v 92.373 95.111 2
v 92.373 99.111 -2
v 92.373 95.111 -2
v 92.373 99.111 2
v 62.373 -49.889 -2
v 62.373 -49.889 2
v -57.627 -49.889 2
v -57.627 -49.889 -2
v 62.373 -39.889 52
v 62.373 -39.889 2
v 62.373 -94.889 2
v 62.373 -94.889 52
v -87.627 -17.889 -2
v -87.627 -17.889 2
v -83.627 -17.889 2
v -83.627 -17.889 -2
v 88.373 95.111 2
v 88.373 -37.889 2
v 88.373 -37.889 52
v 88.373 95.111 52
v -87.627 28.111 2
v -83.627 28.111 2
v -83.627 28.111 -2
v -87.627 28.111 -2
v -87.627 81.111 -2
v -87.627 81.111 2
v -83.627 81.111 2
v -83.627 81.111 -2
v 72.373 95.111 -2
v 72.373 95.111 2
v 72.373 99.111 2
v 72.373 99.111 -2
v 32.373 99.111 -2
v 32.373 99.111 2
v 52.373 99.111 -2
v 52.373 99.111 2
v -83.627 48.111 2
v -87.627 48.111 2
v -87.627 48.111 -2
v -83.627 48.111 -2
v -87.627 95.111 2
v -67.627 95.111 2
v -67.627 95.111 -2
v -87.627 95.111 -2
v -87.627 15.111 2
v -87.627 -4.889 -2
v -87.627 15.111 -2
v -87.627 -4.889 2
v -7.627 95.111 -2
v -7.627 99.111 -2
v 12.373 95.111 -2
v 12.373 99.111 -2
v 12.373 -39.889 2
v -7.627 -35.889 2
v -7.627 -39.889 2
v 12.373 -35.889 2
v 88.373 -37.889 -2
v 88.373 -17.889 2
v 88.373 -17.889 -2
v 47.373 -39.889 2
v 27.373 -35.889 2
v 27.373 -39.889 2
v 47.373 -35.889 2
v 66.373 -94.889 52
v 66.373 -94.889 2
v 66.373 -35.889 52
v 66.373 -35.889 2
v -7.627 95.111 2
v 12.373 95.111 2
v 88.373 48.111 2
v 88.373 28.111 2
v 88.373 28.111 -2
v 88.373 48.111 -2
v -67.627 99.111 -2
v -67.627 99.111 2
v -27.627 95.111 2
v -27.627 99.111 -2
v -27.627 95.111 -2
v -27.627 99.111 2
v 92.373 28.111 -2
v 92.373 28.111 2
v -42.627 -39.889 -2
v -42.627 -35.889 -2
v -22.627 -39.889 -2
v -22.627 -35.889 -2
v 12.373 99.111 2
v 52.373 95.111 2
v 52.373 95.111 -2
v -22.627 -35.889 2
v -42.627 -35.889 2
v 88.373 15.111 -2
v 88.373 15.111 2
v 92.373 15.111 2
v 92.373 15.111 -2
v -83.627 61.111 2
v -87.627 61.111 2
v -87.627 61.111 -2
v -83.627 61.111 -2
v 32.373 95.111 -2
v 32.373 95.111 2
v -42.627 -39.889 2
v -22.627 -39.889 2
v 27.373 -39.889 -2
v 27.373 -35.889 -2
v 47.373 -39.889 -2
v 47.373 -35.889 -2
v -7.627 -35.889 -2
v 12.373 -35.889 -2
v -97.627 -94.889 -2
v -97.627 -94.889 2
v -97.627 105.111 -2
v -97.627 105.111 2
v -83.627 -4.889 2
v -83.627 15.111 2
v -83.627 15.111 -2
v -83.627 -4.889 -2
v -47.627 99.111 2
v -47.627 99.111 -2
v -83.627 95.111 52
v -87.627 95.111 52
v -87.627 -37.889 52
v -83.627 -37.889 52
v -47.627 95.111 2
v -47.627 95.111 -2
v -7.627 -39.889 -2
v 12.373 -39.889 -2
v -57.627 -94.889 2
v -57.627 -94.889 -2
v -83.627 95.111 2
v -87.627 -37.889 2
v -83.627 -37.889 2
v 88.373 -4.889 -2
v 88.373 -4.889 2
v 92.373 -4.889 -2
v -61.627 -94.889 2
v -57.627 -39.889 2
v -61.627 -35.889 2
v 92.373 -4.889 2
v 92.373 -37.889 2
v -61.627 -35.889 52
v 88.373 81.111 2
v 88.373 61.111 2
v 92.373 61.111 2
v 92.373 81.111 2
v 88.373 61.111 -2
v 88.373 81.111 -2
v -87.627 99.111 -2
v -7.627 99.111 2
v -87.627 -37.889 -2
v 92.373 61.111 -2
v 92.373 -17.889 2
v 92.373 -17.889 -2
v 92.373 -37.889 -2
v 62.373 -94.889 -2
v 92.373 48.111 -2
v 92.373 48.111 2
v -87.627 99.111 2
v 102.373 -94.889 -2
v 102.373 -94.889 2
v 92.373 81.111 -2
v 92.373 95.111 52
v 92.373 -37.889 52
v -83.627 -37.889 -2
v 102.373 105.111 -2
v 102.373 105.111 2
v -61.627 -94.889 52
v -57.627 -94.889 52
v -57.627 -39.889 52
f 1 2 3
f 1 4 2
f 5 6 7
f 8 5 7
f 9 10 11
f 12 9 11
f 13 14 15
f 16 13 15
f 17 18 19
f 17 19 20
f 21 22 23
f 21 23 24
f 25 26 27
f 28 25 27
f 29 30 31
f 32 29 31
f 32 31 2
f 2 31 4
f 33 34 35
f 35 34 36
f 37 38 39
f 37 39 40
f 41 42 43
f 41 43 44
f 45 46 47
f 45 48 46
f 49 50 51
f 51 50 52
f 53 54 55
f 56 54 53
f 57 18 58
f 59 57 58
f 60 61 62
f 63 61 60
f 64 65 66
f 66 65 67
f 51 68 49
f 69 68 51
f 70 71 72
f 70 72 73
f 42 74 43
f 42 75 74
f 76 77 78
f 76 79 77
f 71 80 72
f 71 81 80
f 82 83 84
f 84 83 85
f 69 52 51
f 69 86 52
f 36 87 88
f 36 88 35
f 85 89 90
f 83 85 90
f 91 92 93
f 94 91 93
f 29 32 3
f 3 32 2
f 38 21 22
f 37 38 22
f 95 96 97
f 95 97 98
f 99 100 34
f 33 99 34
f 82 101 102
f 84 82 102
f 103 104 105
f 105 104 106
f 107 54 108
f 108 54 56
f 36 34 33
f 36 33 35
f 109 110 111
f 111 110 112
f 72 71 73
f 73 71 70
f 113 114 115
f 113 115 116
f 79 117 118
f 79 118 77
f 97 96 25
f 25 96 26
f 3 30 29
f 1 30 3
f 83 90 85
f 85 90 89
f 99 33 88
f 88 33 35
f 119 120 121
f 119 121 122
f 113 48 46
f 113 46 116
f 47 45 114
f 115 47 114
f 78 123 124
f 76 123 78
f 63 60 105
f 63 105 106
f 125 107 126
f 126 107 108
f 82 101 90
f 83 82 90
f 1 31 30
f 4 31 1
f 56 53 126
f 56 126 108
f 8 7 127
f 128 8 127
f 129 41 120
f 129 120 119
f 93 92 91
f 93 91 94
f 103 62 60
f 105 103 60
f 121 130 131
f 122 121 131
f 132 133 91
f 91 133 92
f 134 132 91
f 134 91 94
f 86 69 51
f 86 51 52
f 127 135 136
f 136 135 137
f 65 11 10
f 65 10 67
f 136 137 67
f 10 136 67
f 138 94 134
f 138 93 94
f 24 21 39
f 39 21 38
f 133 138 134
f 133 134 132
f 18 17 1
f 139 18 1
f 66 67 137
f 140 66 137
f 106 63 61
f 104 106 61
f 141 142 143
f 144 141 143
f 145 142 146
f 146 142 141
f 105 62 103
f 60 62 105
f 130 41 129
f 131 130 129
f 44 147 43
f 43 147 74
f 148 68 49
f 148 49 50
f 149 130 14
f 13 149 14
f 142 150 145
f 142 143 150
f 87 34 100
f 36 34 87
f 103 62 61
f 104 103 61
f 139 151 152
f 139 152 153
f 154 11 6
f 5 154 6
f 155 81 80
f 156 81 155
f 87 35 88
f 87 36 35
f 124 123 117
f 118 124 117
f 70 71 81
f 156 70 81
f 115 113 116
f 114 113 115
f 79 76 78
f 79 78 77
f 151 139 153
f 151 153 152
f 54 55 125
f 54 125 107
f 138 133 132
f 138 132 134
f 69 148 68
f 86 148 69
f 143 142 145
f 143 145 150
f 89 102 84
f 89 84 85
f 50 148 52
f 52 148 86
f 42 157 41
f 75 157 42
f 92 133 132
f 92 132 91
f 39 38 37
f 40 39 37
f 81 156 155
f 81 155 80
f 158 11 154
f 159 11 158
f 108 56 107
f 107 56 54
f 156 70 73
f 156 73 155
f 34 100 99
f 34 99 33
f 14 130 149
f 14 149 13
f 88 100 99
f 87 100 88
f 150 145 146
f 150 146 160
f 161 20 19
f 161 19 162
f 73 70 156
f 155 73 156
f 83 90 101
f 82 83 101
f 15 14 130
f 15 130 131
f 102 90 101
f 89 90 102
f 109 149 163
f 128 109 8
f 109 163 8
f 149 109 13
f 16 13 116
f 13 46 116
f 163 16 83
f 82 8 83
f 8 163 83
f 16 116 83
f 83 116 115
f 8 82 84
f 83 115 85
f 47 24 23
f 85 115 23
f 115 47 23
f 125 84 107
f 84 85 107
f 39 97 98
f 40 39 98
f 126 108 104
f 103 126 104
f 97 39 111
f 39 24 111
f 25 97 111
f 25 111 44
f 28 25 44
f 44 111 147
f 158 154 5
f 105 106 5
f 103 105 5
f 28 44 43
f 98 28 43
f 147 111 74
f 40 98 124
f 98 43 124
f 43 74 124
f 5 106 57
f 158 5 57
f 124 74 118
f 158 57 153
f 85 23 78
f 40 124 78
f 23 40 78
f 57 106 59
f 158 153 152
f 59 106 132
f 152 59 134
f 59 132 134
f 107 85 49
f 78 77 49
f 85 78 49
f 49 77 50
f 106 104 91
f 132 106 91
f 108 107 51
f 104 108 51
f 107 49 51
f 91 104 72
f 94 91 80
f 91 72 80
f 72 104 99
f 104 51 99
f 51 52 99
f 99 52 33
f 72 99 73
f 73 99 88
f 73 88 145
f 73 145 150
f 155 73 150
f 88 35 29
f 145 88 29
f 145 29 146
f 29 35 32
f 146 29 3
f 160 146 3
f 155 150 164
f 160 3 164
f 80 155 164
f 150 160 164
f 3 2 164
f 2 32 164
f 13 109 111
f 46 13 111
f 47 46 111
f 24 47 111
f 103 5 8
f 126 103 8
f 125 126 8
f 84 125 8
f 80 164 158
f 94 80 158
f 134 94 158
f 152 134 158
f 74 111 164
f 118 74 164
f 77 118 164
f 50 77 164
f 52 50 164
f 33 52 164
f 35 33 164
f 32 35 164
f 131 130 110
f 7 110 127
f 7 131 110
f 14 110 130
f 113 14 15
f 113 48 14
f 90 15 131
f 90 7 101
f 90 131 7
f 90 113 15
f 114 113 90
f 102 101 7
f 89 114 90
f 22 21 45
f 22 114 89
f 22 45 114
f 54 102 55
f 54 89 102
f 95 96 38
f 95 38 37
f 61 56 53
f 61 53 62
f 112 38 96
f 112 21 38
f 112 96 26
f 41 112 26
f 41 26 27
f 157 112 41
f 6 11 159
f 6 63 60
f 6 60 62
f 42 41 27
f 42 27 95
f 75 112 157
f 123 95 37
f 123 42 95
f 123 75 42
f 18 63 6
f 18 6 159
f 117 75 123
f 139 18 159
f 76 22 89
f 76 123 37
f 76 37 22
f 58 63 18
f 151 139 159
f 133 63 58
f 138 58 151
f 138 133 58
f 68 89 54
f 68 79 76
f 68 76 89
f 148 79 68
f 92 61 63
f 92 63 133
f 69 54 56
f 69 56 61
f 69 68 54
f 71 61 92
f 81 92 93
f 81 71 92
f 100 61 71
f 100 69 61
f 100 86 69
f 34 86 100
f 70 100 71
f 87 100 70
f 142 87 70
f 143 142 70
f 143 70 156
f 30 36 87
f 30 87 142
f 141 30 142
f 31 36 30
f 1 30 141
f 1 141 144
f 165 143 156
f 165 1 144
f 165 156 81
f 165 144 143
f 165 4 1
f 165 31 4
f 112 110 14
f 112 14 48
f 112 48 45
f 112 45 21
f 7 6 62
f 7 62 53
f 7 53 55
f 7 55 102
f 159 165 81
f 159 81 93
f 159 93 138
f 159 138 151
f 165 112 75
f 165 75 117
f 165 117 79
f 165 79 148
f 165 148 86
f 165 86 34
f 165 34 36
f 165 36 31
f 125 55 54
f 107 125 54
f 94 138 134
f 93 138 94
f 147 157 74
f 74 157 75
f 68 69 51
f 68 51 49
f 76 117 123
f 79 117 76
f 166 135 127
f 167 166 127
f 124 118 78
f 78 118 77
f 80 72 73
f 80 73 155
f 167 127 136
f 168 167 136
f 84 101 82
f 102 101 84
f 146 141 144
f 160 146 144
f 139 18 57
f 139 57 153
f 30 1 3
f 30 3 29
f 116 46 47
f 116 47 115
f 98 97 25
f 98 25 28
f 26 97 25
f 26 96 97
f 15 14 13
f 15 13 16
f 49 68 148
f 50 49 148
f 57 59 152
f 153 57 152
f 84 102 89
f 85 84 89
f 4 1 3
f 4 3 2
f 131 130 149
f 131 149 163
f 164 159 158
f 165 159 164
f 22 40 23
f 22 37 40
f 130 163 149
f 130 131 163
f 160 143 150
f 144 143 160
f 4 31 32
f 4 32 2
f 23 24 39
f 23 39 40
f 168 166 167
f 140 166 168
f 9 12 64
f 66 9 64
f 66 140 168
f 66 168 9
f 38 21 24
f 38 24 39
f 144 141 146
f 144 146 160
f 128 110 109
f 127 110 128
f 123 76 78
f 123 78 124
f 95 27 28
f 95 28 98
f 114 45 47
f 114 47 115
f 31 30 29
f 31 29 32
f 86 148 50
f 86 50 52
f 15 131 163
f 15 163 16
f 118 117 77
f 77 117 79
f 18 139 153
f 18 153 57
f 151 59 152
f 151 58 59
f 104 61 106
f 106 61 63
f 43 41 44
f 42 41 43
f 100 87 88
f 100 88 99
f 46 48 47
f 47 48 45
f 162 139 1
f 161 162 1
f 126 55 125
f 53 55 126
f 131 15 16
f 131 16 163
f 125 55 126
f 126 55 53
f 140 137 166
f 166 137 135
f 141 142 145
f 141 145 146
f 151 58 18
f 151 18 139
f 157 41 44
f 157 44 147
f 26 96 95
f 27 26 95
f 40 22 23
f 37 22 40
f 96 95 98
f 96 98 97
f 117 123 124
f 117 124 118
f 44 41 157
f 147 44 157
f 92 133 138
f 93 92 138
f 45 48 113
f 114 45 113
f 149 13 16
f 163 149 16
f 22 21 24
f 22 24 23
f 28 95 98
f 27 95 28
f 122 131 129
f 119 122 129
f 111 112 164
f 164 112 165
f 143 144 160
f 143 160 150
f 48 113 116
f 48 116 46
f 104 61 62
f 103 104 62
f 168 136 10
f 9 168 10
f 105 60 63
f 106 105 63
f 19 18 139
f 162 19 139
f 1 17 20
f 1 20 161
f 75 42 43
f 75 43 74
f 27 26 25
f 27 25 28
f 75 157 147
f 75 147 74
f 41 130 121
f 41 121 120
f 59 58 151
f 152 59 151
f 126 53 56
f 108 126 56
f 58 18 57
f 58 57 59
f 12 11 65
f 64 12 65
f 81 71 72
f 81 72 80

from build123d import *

# Parameters (mm, degrees)
F0_W     = 200
F0_H     = 200
F1_DEPTH = 2
F3_DEPTH = 4
F4_W     = 10
F4_H     = 4
F5_DEPTH = 25
F6_W     = 4
F6_H     = 20
F7_DEPTH = 4
F6_W_2   = 20
F6_H_2   = 4
F8_W     = 4
F8_H     = 133
F9_DEPTH = 50
F8_W_2   = 120
F8_H_2   = 4


with BuildPart() as f1:
    # F0 (on Top) → F1 (new body, symmetric)
    with BuildSketch(Plane.XY):
        with Locations((2.3726588649, 5.1106324806)):
            Rectangle(F0_W, F0_H)
        Polygon((-87.6273411351, -37.8893675194), (-87.6273411351, -27.8893675194), (-87.6273411351, -17.8893675194), (-83.6273411351, -17.8893675194), (-83.6273411351, -27.8893675194), (-83.6273411351, -37.8893675194), align=None, mode=Mode.SUBTRACT)
        Polygon((92.3726588649, -17.8893675194), (92.3726588649, -27.8893675194), (92.3726588649, -37.8893675194), (88.3726588649, -37.8893675194), (88.3726588649, -27.8893675194), (88.3726588649, -17.8893675194), align=None, mode=Mode.SUBTRACT)
        Polygon((-87.6273411351, 5.1106324806), (-87.6273411351, 15.1106324806), (-83.6273411351, 15.1106324806), (-83.6273411351, 5.1106324806), (-83.6273411351, -4.8893675194), (-87.6273411351, -4.8893675194), align=None, mode=Mode.SUBTRACT)
        Polygon((-83.6273411351, 28.1106324806), (-87.6273411351, 28.1106324806), (-87.6273411351, 38.1106324806), (-87.6273411351, 48.1106324806), (-83.6273411351, 48.1106324806), (-83.6273411351, 38.1106324806), align=None, mode=Mode.SUBTRACT)
        Polygon((-87.6273411351, 71.1106324806), (-87.6273411351, 81.1106324806), (-83.6273411351, 81.1106324806), (-83.6273411351, 71.1106324806), (-83.6273411351, 61.1106324806), (-87.6273411351, 61.1106324806), align=None, mode=Mode.SUBTRACT)
        Polygon((-67.6273411351, 95.1106324806), (-77.6273411351, 95.1106324806), (-87.6273411351, 95.1106324806), (-87.6273411351, 99.1106324806), (-77.6273411351, 99.1106324806), (-67.6273411351, 99.1106324806), align=None, mode=Mode.SUBTRACT)
        Polygon((-27.6273411351, 95.1106324806), (-37.6273411351, 95.1106324806), (-47.6273411351, 95.1106324806), (-47.6273411351, 99.1106324806), (-37.6273411351, 99.1106324806), (-27.6273411351, 99.1106324806), align=None, mode=Mode.SUBTRACT)
        Polygon((92.3726588649, 5.1106324806), (92.3726588649, -4.8893675194), (88.3726588649, -4.8893675194), (88.3726588649, 5.1106324806), (88.3726588649, 15.1106324806), (92.3726588649, 15.1106324806), align=None, mode=Mode.SUBTRACT)
        Polygon((88.3726588649, 28.1106324806), (88.3726588649, 38.1106324806), (88.3726588649, 48.1106324806), (92.3726588649, 48.1106324806), (92.3726588649, 38.1106324806), (92.3726588649, 28.1106324806), align=None, mode=Mode.SUBTRACT)
        Polygon((12.3726588649, 95.1106324806), (2.3726588649, 95.1106324806), (-7.6273411351, 95.1106324806), (-7.6273411351, 99.1106324806), (2.3726588649, 99.1106324806), (12.3726588649, 99.1106324806), align=None, mode=Mode.SUBTRACT)
        Polygon((52.3726588649, 95.1106324806), (42.3726588649, 95.1106324806), (32.3726588649, 95.1106324806), (32.3726588649, 99.1106324806), (42.3726588649, 99.1106324806), (52.3726588649, 99.1106324806), align=None, mode=Mode.SUBTRACT)
        Polygon((88.3726588649, 61.1106324806), (88.3726588649, 71.1106324806), (88.3726588649, 81.1106324806), (92.3726588649, 81.1106324806), (92.3726588649, 71.1106324806), (92.3726588649, 61.1106324806), align=None, mode=Mode.SUBTRACT)
        Polygon((92.3726588649, 95.1106324806), (82.3726588649, 95.1106324806), (72.3726588649, 95.1106324806), (72.3726588649, 99.1106324806), (82.3726588649, 99.1106324806), (92.3726588649, 99.1106324806), align=None, mode=Mode.SUBTRACT)
    extrude(amount=F1_DEPTH, both=True)

    # F2 (on face) → F3 (cut, through all)
    with BuildSketch(Plane.XY.offset(2)):
        Polygon((62.3726588649, -49.8893675194), (2.3726588649, -49.8893675194), (-57.6273411351, -49.8893675194), (-57.6273411351, -94.8893675194), (2.3726588649, -94.8893675194), (62.3726588649, -94.8893675194), align=None)
    extrude(amount=-F3_DEPTH, mode=Mode.SUBTRACT)

    # F4 (on face) → F5 (cut)
    with BuildSketch(Plane.XY.offset(2)):
        with Locations((-2.6273411351, -37.8893675194)):
            Rectangle(F4_W, F4_H)
        with Locations((7.3726588649, -37.8893675194)):
            Rectangle(F4_W, F4_H)
        Polygon((47.3726588649, -35.8893675194), (37.3726588649, -35.8893675194), (27.3726588649, -35.8893675194), (27.3726588649, -39.8893675194), (37.3726588649, -39.8893675194), (47.3726588649, -39.8893675194), align=None)
        Polygon((-42.6273411351, -39.8893675194), (-32.6273411351, -39.8893675194), (-22.6273411351, -39.8893675194), (-22.6273411351, -35.8893675194), (-32.6273411351, -35.8893675194), (-42.6273411351, -35.8893675194), align=None)
    extrude(amount=-F5_DEPTH, mode=Mode.SUBTRACT)


with BuildPart() as f7:
    # F6 (on face) → F7 (new body)
    with BuildSketch(Plane.XY.offset(2)):
        with Locations((-85.6273411351, 71.1106324806)):
            Rectangle(F6_W, F6_H)
    extrude(amount=-F7_DEPTH)


with BuildPart() as f7b:
    # F6 (on face) → F7, piece 2 (new body)
    with BuildSketch(Plane.XY.offset(2)):
        with Locations((-85.6273411351, 38.1106324806)):
            Rectangle(F6_W, F6_H)
    extrude(amount=-F7_DEPTH)


with BuildPart() as f7c:
    # F6 (on face) → F7, piece 3 (new body)
    with BuildSketch(Plane.XY.offset(2)):
        with Locations((-85.6273411351, 5.1106324806)):
            Rectangle(F6_W, F6_H)
    extrude(amount=-F7_DEPTH)


with BuildPart() as f7d:
    # F6 (on face) → F7, piece 4 (new body)
    with BuildSketch(Plane.XY.offset(2)):
        with Locations((-85.6273411351, -27.8893675194)):
            Rectangle(F6_W, F6_H)
    extrude(amount=-F7_DEPTH)


with BuildPart() as f7e:
    # F6 (on face) → F7, piece 5 (new body)
    with BuildSketch(Plane.XY.offset(2)):
        with Locations((-32.6273411351, -37.8893675194)):
            Rectangle(F6_W_2, F6_H_2)
    extrude(amount=-F7_DEPTH)


with BuildPart() as f7f:
    # F6 (on face) → F7, piece 6 (new body)
    with BuildSketch(Plane.XY.offset(2)):
        with Locations((2.3726588649, -37.8893675194)):
            Rectangle(F6_W_2, F6_H_2)
    extrude(amount=-F7_DEPTH)


with BuildPart() as f7g:
    # F6 (on face) → F7, piece 7 (new body)
    with BuildSketch(Plane.XY.offset(2)):
        with Locations((37.3726588649, -37.8893675194)):
            Rectangle(F6_W_2, F6_H_2)
    extrude(amount=-F7_DEPTH)


with BuildPart() as f7h:
    # F6 (on face) → F7, piece 8 (new body)
    with BuildSketch(Plane.XY.offset(2)):
        with Locations((90.3726588649, -27.8893675194)):
            Rectangle(F6_W, F6_H)
    extrude(amount=-F7_DEPTH)


with BuildPart() as f7i:
    # F6 (on face) → F7, piece 9 (new body)
    with BuildSketch(Plane.XY.offset(2)):
        with Locations((90.3726588649, 5.1106324806)):
            Rectangle(F6_W, F6_H)
    extrude(amount=-F7_DEPTH)


with BuildPart() as f7j:
    # F6 (on face) → F7, piece 10 (new body)
    with BuildSketch(Plane.XY.offset(2)):
        with Locations((90.3726588649, 38.1106324806)):
            Rectangle(F6_W, F6_H)
    extrude(amount=-F7_DEPTH)


with BuildPart() as f7k:
    # F6 (on face) → F7, piece 11 (new body)
    with BuildSketch(Plane.XY.offset(2)):
        with Locations((90.3726588649, 71.1106324806)):
            Rectangle(F6_W, F6_H)
    extrude(amount=-F7_DEPTH)


with BuildPart() as f7l:
    # F6 (on face) → F7, piece 12 (new body)
    with BuildSketch(Plane.XY.offset(2)):
        with Locations((82.3726588649, 97.1106324806)):
            Rectangle(F6_W_2, F6_H_2)
    extrude(amount=-F7_DEPTH)


with BuildPart() as f7m:
    # F6 (on face) → F7, piece 13 (new body)
    with BuildSketch(Plane.XY.offset(2)):
        with Locations((42.3726588649, 97.1106324806)):
            Rectangle(F6_W_2, F6_H_2)
    extrude(amount=-F7_DEPTH)


with BuildPart() as f7n:
    # F6 (on face) → F7, piece 14 (new body)
    with BuildSketch(Plane.XY.offset(2)):
        with Locations((2.3726588649, 97.1106324806)):
            Rectangle(F6_W_2, F6_H_2)
    extrude(amount=-F7_DEPTH)


with BuildPart() as f7o:
    # F6 (on face) → F7, piece 15 (new body)
    with BuildSketch(Plane.XY.offset(2)):
        with Locations((-37.6273411351, 97.1106324806)):
            Rectangle(F6_W_2, F6_H_2)
    extrude(amount=-F7_DEPTH)


with BuildPart() as f7p:
    # F6 (on face) → F7, piece 16 (new body)
    with BuildSketch(Plane.XY.offset(2)):
        with Locations((-77.6273411351, 97.1106324806)):
            Rectangle(F6_W_2, F6_H_2)
    extrude(amount=-F7_DEPTH)


with BuildPart() as f9:
    # F8 (on face) → F9 (new body)
    with BuildSketch(Plane.XY.offset(2)):
        with Locations((-85.6273411351, 28.6106324806)):
            Rectangle(F8_W, F8_H)
    extrude(amount=F9_DEPTH)


with BuildPart() as f9b:
    # F8 (on face) → F9, piece 2 (new body)
    with BuildSketch(Plane.XY.offset(2)):
        with Locations((90.3726588649, 28.6106324806)):
            Rectangle(F8_W, F8_H)
    extrude(amount=F9_DEPTH)


with BuildPart() as f9c:
    # F8 (on face) → F9, piece 3 (new body)
    with BuildSketch(Plane.XY.offset(2)):
        with Locations((2.3726588649, -37.8893675194)):
            Rectangle(F8_W_2, F8_H_2)
        Polygon((-57.6273411351, -94.8893675194), (-57.6273411351, -39.8893675194), (-57.6273411351, -35.8893675194), (-61.6273411351, -35.8893675194), (-61.6273411351, -94.8893675194), align=None)
        Polygon((62.3726588649, -35.8893675194), (62.3726588649, -39.8893675194), (62.3726588649, -94.8893675194), (66.3726588649, -94.8893675194), (66.3726588649, -35.8893675194), align=None)
    extrude(amount=F9_DEPTH)


solid = Compound([f1.part, f7.part, f7b.part, f7c.part, f7d.part, f7e.part, f7f.part, f7g.part, f7h.part, f7i.part, f7j.part, f7k.part, f7l.part, f7m.part, f7n.part, f7o.part, f7p.part, f9.part, f9b.part, f9c.part])
